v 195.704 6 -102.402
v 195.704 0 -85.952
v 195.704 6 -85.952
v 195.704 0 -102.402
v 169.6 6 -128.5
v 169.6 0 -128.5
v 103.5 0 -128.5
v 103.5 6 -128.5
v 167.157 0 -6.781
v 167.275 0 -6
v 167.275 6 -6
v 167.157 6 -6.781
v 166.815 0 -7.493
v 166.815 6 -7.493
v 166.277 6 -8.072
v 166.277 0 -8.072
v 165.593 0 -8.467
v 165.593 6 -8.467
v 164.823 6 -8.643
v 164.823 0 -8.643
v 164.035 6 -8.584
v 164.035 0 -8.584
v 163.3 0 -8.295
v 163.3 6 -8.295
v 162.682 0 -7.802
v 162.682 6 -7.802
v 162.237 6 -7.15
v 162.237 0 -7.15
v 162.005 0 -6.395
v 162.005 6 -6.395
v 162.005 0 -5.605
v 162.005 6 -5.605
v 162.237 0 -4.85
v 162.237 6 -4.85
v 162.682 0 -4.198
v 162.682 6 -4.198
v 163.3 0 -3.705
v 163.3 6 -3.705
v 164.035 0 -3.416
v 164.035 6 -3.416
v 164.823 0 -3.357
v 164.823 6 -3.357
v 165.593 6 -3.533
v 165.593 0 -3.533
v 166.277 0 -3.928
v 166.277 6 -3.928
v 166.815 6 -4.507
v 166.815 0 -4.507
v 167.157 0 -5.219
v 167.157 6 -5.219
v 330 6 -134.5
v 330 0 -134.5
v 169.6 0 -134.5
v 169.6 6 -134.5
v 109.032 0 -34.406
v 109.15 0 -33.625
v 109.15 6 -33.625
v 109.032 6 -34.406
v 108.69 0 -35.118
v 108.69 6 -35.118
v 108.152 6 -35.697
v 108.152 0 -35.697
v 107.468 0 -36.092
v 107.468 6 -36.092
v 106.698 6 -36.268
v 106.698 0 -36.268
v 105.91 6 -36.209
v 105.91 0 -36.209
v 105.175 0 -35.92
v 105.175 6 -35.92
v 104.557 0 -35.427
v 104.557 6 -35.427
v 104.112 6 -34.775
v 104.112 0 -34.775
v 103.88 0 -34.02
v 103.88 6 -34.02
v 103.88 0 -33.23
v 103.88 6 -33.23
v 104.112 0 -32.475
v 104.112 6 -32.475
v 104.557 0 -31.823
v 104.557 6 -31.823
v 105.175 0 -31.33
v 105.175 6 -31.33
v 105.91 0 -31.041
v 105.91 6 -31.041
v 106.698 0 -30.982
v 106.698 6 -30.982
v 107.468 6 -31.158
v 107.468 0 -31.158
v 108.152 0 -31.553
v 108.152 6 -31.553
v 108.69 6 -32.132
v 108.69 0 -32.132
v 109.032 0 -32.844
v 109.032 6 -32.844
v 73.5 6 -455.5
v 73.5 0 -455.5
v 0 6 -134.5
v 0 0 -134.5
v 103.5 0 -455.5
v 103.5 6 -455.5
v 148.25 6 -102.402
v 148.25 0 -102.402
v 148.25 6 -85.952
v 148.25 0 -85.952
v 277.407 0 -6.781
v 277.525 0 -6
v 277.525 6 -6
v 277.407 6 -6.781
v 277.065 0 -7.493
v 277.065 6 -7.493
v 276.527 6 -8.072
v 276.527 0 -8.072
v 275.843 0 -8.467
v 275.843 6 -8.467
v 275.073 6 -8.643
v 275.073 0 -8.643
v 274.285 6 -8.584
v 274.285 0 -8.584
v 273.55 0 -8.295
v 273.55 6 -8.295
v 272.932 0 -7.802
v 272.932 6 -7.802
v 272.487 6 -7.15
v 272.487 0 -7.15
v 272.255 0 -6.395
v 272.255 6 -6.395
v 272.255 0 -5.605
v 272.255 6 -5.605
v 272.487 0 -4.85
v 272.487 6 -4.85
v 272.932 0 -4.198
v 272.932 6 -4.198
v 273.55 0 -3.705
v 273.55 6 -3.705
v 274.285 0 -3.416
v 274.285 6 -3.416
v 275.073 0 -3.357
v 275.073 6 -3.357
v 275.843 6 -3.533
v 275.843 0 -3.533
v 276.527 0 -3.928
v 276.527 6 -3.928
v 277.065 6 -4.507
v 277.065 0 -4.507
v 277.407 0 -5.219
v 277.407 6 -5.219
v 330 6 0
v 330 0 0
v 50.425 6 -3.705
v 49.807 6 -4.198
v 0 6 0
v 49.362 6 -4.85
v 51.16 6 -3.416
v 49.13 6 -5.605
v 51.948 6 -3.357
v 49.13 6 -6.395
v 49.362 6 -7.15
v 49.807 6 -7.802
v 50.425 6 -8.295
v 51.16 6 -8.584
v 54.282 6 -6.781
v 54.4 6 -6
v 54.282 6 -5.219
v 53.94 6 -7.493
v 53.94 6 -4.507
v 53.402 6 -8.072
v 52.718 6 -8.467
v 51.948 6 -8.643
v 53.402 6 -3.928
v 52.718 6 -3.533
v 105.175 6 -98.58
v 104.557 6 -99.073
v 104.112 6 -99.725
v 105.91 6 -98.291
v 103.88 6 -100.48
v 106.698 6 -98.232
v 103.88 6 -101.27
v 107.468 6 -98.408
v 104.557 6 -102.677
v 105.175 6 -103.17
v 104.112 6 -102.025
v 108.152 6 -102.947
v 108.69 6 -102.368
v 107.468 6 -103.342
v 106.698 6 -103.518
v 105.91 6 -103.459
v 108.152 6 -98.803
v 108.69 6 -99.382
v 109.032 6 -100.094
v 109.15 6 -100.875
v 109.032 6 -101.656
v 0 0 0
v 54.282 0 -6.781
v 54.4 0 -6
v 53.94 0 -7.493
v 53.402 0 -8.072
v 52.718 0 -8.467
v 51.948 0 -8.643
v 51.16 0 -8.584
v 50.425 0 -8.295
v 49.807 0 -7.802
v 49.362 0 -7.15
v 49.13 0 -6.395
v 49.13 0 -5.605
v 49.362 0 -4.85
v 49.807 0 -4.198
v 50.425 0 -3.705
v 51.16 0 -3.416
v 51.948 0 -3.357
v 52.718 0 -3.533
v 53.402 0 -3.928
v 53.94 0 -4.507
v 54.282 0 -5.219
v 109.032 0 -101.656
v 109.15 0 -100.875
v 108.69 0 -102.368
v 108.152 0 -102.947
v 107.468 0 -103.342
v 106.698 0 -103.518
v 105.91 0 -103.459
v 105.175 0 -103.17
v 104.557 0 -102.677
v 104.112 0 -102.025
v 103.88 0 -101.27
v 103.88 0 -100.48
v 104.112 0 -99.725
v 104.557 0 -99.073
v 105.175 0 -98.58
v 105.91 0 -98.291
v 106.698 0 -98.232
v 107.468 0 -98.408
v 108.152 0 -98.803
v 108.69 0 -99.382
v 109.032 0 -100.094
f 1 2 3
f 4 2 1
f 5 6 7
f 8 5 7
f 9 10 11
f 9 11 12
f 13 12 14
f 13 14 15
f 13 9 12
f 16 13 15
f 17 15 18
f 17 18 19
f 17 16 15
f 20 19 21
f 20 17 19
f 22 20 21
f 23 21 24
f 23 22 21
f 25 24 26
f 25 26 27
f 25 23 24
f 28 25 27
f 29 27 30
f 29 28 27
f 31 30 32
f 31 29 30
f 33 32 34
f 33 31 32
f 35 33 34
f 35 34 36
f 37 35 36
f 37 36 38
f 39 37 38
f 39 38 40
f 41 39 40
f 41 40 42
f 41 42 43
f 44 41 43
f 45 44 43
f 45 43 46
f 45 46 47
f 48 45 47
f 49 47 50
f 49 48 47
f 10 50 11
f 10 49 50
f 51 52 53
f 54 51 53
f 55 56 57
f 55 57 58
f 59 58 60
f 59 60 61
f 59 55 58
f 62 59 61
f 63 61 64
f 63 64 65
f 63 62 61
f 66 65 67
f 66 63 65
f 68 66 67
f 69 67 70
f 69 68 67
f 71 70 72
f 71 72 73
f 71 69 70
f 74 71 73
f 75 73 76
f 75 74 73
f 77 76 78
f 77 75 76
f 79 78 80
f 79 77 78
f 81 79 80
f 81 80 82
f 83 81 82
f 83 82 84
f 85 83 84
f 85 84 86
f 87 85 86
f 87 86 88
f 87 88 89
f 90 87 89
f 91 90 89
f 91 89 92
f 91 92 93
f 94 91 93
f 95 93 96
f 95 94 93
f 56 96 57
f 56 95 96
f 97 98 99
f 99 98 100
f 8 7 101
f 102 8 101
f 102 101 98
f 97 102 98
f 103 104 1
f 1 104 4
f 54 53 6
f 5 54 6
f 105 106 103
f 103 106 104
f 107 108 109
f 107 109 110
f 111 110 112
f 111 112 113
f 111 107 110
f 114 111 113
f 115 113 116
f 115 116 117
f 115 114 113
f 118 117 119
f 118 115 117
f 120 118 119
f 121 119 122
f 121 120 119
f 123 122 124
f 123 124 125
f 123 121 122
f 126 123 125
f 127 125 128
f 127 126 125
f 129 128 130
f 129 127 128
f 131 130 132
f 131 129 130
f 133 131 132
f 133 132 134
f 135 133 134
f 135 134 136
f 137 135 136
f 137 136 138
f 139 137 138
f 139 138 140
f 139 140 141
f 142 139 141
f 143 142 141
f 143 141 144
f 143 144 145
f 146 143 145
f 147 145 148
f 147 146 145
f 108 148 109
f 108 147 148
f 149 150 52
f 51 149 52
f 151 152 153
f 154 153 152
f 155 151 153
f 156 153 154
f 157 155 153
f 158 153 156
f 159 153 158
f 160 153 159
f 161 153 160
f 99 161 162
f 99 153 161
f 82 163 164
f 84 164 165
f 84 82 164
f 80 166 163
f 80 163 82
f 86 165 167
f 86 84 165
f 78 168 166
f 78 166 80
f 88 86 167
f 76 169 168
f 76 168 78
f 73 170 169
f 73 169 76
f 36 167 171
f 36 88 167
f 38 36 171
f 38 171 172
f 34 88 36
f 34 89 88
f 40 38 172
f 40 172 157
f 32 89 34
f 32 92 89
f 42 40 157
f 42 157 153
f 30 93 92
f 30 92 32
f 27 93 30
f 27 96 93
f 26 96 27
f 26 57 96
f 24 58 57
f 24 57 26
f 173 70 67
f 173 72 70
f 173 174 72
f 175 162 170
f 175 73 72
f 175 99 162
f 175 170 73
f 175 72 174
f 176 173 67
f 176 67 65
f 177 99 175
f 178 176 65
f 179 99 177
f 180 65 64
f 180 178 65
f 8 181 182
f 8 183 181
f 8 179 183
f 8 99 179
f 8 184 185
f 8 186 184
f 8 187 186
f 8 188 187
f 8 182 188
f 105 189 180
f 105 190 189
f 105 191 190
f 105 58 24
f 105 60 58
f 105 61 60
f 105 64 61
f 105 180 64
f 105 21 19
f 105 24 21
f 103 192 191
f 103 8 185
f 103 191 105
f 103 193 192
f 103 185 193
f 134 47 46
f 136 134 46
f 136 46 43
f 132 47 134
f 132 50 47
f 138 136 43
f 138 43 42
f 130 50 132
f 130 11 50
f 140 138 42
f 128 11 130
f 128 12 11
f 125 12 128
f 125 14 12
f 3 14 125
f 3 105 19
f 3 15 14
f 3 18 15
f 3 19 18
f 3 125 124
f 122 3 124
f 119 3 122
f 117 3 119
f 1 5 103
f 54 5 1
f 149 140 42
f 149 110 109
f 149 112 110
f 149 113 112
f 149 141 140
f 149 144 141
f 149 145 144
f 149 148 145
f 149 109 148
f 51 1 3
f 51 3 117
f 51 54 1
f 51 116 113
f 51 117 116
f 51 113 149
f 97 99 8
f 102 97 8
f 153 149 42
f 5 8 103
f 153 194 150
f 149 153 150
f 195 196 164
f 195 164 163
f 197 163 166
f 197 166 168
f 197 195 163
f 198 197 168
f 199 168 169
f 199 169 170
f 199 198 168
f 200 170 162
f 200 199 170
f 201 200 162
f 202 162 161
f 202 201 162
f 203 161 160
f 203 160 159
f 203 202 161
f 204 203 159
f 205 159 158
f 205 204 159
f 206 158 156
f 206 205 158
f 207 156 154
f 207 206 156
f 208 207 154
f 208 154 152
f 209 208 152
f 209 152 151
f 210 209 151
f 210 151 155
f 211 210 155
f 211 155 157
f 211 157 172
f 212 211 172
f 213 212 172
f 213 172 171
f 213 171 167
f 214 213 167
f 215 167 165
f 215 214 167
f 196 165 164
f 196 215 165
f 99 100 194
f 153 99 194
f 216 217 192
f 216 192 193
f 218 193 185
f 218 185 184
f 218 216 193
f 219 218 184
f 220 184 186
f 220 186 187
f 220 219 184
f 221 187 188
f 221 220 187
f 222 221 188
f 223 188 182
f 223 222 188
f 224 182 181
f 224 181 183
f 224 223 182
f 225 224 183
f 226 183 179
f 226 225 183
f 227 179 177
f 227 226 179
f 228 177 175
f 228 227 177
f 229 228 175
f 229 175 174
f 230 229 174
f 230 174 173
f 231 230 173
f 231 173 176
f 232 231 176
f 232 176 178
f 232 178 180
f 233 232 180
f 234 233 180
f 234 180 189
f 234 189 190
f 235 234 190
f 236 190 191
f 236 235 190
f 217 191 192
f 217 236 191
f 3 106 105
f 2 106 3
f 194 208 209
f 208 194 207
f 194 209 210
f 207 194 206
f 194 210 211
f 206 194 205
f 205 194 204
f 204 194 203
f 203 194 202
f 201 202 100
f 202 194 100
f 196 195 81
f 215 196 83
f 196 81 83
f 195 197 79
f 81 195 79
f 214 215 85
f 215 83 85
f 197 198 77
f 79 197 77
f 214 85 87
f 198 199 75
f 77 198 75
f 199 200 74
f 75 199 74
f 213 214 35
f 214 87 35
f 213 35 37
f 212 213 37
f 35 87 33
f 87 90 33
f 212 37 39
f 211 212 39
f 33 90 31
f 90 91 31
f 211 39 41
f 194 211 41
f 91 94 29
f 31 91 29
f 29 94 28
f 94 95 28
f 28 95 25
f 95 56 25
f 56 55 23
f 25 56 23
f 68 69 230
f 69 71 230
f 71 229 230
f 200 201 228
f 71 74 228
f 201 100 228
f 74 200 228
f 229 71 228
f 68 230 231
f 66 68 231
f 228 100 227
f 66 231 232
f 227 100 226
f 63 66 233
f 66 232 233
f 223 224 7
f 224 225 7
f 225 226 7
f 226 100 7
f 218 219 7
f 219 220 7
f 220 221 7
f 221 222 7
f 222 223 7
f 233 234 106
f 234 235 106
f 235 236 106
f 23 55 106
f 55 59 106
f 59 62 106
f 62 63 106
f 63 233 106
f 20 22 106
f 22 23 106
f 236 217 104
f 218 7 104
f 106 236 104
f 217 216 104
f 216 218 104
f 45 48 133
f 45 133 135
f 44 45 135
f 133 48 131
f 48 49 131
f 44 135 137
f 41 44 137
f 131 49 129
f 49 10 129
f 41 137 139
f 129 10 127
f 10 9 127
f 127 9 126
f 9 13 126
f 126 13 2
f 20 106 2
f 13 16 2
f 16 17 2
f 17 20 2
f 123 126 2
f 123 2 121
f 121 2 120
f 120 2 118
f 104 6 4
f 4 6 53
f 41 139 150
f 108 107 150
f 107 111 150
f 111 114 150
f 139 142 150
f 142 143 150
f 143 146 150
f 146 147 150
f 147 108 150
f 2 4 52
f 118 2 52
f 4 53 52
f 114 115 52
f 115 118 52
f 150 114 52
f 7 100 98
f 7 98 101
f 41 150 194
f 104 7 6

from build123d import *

# Parameters (mm, degrees)
LEG_OUTLINE_R = 2.65
LEG_OUTLINE_W = 47.454147397
LEG_OUTLINE_H = 16.449498304
LEG_DEPTH     = 6


# Read off the part's stored shape, not the designer's step: leg
with BuildPart() as part:
    # leg outline → leg (new body)
    with BuildSketch(Plane(origin=(0, 0, 0), x_dir=(1, 0, 0), z_dir=(0, 1, 0))):
        Polygon((0, 0), (330, 0), (330, 134.5), (169.6, 134.5), (169.6, 128.5), (103.5, 128.5), (103.5, 455.5), (73.5, 455.5), (0, 134.5), align=None)
        with Locations((51.75, 6)):
            Circle(LEG_OUTLINE_R, mode=Mode.SUBTRACT)
        with Locations((106.5, 33.625)):
            Circle(LEG_OUTLINE_R, mode=Mode.SUBTRACT)
        with Locations((164.625, 6)):
            Circle(LEG_OUTLINE_R, mode=Mode.SUBTRACT)
        with Locations((106.5, 100.875)):
            Circle(LEG_OUTLINE_R, mode=Mode.SUBTRACT)
        with Locations((171.976991955, 94.176840096)):
            Rectangle(LEG_OUTLINE_W, LEG_OUTLINE_H, mode=Mode.SUBTRACT)
        with Locations((274.875, 6)):
            Circle(LEG_OUTLINE_R, mode=Mode.SUBTRACT)
    extrude(amount=LEG_DEPTH)


solid = part.part
